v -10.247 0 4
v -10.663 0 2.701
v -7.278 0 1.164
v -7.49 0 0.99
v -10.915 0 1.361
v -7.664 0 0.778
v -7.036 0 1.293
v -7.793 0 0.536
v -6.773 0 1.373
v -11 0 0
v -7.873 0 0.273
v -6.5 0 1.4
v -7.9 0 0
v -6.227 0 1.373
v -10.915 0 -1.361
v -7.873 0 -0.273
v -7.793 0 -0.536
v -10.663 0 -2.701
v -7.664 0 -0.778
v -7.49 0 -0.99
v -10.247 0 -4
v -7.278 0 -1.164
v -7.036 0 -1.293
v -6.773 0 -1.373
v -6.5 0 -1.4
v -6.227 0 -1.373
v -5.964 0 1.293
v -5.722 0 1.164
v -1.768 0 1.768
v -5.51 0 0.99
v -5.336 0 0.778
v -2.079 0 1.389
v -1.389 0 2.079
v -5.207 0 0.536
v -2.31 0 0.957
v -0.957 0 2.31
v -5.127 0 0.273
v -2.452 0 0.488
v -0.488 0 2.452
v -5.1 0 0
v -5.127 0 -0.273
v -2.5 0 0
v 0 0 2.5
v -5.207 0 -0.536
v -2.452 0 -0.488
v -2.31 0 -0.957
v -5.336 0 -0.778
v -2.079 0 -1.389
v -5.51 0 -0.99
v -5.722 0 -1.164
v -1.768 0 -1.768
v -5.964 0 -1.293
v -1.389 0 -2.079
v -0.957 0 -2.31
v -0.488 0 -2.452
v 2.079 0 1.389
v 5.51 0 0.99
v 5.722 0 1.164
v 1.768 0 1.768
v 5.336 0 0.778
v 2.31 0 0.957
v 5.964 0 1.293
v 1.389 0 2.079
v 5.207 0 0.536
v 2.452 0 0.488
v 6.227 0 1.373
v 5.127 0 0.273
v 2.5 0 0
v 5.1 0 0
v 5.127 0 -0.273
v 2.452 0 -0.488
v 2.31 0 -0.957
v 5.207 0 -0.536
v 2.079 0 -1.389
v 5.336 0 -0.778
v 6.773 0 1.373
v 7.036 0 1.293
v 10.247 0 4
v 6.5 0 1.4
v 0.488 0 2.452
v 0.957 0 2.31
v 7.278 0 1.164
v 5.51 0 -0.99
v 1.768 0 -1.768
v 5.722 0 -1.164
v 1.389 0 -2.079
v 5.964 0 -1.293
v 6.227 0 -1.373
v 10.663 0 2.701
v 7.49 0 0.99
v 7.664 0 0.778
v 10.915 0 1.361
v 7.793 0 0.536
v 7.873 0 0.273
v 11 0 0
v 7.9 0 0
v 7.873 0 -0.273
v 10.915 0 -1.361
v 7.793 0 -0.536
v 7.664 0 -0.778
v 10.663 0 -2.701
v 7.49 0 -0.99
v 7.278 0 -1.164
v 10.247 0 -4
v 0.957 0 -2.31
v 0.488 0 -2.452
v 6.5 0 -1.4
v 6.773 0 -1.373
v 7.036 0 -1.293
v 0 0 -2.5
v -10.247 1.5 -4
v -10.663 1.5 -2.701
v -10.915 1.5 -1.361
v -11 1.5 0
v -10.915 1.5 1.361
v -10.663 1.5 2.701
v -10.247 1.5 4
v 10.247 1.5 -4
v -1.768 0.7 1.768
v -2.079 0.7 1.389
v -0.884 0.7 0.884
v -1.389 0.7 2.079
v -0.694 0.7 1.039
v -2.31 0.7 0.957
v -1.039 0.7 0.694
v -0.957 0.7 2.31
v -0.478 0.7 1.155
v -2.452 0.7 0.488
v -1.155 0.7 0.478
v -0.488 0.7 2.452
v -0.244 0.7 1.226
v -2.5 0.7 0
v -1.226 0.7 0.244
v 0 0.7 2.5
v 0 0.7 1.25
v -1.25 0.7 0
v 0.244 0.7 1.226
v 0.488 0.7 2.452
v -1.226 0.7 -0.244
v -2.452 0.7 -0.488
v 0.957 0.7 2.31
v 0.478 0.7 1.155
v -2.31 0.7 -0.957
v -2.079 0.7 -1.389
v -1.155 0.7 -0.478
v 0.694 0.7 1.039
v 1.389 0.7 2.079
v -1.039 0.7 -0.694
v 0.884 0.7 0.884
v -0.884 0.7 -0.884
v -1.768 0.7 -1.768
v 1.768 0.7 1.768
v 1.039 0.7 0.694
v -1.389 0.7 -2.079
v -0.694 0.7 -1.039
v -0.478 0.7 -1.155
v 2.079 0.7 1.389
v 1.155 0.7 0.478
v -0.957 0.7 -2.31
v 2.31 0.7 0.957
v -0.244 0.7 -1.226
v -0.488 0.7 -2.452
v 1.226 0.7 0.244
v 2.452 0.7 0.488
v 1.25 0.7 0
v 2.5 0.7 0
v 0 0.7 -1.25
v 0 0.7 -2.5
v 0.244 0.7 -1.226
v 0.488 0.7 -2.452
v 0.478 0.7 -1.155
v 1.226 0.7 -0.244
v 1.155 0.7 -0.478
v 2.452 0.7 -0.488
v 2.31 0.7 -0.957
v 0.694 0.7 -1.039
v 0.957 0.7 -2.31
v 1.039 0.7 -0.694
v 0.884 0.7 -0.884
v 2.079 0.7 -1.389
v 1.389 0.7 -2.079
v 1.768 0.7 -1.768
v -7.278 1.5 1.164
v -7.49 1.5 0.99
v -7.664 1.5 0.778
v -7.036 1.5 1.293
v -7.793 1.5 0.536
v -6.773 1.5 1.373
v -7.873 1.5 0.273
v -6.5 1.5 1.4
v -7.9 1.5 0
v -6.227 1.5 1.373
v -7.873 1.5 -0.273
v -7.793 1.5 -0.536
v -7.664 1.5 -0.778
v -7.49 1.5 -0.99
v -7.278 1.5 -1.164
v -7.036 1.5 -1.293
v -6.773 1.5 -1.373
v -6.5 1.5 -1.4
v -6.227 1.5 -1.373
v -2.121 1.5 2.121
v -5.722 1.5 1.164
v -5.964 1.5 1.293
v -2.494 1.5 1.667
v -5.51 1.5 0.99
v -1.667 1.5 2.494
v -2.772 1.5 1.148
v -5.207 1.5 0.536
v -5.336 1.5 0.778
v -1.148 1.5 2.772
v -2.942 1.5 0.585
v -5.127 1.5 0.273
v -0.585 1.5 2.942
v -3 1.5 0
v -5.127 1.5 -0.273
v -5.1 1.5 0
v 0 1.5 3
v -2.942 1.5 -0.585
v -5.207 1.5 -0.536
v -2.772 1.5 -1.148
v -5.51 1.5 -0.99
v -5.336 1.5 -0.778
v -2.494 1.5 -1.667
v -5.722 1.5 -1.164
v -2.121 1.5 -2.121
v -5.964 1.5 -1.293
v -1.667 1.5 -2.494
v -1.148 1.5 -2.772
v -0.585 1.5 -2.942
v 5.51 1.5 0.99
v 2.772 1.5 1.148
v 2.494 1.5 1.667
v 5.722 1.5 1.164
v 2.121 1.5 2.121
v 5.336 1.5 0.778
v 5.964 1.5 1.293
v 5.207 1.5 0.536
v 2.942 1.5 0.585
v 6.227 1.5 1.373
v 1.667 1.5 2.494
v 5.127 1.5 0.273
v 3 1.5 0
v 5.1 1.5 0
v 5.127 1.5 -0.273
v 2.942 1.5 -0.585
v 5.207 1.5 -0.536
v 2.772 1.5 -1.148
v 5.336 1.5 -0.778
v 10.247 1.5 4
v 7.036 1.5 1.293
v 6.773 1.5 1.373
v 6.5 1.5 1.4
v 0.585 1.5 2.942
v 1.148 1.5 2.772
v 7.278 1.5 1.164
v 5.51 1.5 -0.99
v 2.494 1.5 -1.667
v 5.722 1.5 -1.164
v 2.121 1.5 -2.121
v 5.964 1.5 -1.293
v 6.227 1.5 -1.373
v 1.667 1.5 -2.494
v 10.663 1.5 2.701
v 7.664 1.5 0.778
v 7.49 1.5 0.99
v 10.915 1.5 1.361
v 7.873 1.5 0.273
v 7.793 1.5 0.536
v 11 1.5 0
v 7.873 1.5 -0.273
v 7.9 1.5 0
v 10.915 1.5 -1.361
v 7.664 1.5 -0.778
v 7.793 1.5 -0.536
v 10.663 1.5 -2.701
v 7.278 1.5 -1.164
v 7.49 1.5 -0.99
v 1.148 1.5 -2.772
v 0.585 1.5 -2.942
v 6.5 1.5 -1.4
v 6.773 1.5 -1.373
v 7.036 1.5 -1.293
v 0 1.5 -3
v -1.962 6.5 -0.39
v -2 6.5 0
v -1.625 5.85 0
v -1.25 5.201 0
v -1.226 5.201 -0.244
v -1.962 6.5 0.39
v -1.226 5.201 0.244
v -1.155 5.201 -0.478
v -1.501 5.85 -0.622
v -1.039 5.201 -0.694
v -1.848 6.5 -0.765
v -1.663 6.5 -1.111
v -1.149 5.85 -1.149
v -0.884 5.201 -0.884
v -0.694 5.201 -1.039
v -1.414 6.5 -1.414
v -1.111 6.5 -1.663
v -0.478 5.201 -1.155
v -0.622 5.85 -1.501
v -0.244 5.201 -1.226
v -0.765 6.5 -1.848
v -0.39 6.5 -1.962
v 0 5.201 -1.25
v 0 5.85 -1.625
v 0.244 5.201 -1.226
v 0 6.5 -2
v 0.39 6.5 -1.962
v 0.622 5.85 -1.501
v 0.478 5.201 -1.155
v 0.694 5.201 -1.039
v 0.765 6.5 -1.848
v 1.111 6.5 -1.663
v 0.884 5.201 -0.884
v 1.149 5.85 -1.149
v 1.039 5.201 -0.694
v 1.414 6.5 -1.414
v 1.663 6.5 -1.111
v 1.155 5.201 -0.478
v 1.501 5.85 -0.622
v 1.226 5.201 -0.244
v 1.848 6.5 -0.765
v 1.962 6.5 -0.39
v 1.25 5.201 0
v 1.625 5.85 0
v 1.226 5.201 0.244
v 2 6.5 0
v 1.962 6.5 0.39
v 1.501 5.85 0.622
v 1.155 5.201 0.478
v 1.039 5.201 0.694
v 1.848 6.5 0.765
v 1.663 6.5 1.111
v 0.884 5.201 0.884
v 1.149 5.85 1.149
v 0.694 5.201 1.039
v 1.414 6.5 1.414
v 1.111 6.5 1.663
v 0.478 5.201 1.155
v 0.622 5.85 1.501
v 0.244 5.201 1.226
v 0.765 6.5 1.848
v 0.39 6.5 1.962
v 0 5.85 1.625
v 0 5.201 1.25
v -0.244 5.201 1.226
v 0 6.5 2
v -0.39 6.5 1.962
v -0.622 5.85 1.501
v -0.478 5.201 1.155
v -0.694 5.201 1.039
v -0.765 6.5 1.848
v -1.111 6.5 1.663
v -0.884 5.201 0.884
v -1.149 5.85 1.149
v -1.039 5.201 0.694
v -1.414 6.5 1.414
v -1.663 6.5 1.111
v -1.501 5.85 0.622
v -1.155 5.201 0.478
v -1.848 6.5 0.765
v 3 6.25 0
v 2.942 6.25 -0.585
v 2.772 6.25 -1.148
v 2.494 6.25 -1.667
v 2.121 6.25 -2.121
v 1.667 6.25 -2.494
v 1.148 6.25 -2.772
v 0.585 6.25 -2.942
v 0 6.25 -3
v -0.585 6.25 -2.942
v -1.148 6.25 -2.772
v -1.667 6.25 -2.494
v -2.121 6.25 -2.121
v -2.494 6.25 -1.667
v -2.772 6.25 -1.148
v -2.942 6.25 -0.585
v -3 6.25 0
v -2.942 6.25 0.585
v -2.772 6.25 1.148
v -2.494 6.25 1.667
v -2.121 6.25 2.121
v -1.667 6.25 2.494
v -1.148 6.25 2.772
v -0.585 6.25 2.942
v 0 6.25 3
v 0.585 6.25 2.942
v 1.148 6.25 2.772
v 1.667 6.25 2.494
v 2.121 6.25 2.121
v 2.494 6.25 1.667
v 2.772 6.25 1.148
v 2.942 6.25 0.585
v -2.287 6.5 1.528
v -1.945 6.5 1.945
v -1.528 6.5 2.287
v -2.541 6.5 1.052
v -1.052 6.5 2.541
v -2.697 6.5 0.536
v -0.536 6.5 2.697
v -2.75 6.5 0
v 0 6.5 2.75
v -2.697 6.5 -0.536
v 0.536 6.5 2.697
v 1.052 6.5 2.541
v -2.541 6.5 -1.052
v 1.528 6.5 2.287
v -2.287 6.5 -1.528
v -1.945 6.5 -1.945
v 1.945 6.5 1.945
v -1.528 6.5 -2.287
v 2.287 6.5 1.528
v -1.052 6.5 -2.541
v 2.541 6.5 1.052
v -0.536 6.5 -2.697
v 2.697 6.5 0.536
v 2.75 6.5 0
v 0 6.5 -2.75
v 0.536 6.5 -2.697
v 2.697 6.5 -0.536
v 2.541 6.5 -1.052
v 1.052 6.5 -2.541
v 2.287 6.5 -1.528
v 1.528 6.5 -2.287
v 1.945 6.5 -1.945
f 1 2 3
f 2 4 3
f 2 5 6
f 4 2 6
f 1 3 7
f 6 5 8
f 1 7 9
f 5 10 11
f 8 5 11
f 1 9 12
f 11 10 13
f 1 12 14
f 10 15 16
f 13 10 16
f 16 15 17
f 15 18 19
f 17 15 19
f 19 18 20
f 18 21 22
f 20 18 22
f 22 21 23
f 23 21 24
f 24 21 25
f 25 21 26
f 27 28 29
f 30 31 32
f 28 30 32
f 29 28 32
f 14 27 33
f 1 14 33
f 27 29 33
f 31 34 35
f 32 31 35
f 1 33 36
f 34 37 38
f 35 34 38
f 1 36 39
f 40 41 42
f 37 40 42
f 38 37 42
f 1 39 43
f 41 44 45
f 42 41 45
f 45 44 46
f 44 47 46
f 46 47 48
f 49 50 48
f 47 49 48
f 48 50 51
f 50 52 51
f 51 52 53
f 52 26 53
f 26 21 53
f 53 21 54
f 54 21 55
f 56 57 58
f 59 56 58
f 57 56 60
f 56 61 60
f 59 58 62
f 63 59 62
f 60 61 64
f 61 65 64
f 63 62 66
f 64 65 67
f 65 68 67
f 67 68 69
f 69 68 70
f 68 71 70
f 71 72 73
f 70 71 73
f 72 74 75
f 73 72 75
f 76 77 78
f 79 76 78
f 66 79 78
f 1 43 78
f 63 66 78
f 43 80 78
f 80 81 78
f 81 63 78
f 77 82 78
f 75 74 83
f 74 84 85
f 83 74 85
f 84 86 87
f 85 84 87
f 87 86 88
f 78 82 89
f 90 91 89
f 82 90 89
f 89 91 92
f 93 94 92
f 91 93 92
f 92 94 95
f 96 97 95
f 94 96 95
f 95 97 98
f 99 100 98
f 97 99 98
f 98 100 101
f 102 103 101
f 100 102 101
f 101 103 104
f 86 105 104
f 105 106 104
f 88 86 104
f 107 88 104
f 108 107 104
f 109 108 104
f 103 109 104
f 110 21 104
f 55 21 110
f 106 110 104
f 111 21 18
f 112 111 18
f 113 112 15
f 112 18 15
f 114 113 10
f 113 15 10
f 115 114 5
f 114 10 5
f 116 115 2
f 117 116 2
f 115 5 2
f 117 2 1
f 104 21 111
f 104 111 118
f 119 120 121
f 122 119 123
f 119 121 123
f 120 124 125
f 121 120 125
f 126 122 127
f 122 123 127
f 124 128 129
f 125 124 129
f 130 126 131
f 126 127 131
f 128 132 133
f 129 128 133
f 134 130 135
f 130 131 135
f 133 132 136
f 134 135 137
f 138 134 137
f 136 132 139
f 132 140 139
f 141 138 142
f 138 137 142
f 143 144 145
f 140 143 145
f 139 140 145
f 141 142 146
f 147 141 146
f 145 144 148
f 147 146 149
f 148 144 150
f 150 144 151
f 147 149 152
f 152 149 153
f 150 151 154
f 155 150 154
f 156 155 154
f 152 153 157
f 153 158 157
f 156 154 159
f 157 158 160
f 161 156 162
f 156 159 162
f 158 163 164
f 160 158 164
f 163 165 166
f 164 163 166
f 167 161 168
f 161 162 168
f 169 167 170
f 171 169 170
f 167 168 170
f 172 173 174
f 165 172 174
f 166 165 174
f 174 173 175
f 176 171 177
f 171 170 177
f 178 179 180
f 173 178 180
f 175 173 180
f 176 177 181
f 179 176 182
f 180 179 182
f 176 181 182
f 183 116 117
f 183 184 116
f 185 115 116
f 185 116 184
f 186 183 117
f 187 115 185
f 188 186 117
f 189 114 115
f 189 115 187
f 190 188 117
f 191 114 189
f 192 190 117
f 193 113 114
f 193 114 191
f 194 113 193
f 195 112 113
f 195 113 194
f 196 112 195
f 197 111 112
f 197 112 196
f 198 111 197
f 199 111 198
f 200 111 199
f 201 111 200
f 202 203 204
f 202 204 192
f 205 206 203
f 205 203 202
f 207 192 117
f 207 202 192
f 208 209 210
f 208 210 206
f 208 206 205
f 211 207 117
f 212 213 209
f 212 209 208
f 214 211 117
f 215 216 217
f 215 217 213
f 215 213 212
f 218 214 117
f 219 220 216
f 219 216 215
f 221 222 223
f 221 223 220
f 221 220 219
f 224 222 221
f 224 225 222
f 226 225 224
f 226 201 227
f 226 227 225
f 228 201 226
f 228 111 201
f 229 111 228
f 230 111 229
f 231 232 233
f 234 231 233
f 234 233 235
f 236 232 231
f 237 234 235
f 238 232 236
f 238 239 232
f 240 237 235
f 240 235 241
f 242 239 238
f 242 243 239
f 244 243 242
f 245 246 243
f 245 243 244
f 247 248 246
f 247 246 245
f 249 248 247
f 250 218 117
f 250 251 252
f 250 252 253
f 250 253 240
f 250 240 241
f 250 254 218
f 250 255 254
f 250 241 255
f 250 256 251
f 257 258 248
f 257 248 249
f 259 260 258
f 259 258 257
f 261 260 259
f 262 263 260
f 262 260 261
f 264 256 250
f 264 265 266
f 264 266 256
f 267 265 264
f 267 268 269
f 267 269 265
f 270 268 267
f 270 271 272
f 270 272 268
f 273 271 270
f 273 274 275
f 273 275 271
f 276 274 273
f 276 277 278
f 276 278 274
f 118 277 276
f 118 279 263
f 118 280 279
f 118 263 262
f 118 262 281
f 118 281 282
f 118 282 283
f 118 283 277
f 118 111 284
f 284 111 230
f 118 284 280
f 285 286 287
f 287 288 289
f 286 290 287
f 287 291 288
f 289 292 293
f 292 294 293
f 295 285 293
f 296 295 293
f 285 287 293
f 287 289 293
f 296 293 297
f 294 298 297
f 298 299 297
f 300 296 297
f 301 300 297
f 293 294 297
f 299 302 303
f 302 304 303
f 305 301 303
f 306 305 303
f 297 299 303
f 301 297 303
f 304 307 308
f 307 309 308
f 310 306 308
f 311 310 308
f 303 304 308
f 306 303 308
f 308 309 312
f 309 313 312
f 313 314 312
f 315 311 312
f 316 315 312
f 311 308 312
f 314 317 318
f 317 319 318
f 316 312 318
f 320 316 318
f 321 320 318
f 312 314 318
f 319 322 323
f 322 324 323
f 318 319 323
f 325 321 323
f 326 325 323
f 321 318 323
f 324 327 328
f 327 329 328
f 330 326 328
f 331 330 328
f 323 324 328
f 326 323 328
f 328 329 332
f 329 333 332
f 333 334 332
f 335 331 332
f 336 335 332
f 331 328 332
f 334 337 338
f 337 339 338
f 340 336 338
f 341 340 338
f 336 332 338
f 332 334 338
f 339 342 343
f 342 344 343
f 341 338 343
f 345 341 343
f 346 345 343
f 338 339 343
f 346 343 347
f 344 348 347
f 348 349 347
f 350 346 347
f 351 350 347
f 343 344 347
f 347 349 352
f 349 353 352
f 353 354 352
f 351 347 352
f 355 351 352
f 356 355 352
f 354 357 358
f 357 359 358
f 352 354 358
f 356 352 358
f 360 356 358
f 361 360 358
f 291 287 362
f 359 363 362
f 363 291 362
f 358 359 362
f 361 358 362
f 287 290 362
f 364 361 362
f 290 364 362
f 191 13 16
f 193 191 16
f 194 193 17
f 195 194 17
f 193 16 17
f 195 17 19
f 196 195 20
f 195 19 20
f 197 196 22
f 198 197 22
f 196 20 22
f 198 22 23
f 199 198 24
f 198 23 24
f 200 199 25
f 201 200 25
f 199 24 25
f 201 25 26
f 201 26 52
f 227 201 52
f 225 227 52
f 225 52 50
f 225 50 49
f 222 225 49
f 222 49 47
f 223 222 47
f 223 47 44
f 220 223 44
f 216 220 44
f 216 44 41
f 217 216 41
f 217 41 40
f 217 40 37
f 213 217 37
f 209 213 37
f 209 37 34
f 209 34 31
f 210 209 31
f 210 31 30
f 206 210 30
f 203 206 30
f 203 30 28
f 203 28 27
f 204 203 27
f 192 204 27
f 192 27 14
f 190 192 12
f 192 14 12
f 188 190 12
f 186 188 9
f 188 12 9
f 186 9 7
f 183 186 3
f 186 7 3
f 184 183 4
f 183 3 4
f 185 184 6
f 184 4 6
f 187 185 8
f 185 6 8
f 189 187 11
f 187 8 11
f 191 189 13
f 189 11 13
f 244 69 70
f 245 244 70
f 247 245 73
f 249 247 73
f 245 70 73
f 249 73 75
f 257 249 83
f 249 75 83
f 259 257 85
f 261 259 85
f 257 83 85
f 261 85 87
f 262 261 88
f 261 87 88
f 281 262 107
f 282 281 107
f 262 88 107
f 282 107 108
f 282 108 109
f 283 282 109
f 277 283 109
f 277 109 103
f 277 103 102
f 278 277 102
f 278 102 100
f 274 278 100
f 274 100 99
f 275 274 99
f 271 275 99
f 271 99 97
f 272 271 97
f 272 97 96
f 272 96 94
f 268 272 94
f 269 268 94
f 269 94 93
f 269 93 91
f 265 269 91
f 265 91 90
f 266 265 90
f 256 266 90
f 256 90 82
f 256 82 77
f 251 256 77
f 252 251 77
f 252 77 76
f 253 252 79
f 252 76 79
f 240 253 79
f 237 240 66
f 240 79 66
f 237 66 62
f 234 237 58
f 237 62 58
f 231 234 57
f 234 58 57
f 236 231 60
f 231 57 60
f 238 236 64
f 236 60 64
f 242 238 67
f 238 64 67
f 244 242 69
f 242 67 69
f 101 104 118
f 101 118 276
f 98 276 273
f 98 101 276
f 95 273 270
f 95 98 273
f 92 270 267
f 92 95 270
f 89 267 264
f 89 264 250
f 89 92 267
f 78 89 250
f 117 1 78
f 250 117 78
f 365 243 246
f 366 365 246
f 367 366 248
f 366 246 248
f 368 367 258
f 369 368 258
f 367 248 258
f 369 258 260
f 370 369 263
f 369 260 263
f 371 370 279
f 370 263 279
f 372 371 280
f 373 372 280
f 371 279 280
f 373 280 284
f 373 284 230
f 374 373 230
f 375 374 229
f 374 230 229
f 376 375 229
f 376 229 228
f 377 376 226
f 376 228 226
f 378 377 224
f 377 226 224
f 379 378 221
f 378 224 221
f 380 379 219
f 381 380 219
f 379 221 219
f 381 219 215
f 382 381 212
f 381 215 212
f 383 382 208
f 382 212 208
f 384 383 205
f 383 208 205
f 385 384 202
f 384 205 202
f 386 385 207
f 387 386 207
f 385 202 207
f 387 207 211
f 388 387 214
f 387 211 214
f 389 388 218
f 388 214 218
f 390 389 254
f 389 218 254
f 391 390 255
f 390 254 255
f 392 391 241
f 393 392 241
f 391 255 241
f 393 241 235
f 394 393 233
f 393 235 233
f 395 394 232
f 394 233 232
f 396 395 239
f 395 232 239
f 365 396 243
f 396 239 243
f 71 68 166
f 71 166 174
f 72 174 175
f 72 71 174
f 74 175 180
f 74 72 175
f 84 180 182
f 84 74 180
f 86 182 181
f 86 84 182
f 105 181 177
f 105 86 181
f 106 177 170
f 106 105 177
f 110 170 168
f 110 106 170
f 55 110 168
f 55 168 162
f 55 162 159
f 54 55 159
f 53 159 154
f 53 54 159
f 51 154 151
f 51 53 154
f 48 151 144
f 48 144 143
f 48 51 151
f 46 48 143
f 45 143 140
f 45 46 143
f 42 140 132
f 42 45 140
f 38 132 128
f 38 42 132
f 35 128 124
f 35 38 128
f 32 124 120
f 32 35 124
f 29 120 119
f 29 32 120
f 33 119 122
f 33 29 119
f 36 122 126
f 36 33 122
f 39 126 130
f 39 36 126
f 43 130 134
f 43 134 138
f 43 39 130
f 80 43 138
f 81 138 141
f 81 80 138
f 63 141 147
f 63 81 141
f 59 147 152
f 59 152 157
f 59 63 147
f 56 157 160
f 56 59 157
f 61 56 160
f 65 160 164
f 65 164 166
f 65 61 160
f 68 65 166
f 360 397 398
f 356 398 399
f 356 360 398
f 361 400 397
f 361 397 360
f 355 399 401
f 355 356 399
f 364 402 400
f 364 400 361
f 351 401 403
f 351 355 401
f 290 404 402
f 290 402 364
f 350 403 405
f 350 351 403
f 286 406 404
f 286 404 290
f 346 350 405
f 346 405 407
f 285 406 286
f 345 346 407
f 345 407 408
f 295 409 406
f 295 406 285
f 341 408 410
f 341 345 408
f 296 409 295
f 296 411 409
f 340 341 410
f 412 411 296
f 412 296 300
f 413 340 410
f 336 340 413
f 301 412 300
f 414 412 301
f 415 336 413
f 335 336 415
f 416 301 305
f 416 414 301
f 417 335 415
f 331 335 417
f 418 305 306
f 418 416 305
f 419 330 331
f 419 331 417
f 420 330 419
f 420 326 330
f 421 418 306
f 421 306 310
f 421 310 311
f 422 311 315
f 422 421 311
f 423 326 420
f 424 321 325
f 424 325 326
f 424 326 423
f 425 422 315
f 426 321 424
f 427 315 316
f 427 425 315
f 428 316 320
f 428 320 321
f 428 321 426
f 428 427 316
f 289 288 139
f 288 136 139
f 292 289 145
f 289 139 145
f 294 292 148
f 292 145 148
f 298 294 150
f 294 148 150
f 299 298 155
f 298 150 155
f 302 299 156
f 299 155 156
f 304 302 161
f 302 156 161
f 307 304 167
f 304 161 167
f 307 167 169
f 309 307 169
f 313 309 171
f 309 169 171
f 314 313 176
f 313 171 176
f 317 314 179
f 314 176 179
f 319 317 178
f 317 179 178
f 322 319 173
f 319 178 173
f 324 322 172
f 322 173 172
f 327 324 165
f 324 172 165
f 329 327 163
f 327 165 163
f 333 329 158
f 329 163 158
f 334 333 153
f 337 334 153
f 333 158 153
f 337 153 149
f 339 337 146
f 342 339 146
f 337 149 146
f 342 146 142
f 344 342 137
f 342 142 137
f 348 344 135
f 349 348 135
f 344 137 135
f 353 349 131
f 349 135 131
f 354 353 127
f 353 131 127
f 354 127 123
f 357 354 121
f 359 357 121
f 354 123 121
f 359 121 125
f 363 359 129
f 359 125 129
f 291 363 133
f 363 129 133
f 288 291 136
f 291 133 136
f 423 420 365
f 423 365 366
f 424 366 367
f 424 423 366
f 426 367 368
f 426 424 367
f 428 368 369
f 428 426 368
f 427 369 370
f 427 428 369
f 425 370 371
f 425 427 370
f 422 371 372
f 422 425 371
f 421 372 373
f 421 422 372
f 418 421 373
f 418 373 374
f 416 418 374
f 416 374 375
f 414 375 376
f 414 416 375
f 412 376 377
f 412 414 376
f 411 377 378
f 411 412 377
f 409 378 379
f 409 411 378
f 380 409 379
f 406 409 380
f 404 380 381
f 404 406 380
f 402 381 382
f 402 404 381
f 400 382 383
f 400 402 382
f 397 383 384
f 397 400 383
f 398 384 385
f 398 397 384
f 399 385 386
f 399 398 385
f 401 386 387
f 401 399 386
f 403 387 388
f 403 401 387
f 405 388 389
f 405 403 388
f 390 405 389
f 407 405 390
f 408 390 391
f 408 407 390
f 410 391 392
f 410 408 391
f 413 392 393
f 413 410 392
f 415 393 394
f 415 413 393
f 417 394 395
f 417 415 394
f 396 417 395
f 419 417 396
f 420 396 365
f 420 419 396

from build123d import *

# Parameters (mm, degrees)
BASE_SKETCH_W                   = 20.493901532
BASE_SKETCH_H                   = 8
BASE_EXTRUDE_DEPTH              = 1.5
PROTRUSION_START                = 1.5
PROTRUSION_SKETCH_R             = 3
PROTRUSION_EXTRUDE_DEPTH        = 5
F_2_8_2_8_DIAMETER_HOLE1_D      = 2.8
PROTRUSION_CHAMFER_SIZE         = 0.25
F_2_5MM_DOWEL_HOLE3_D           = 2.5
F_2_5MM_DOWEL_HOLE3_DEPTH       = 6.5
F_2_5MM_DOWEL_HOLE3_CSINK_D     = 4
F_2_5MM_DOWEL_HOLE3_CSINK_ANGLE = 60
F_5MM_CIRCLE_SKETCH_R           = 2.5
F_5MM_DIAMETER_CUT_DEPTH        = 0.7


with BuildPart() as part:
    # Base Sketch → Base Extrude (new body)
    with BuildSketch(Plane(origin=(0, 0, 0), x_dir=(1, 0, 0), z_dir=(0, 1, 0))):
        with BuildLine():
            Line((-10.246950766, -4), (-10.246950766, 4))
            ThreePointArc((-10.246950766, 4), (-11, 0), (-10.246950766, -4))
        make_face()
        Rectangle(BASE_SKETCH_W, BASE_SKETCH_H)
        with BuildLine():
            Line((10.246950766, -4), (10.246950766, 4))
            ThreePointArc((10.246950766, 4), (11, 0), (10.246950766, -4))
        make_face()
    extrude(amount=BASE_EXTRUDE_DEPTH)

    # Protrusion Sketch → Protrusion Extrude (add)
    with BuildSketch(Plane(origin=(0, 0, 0), x_dir=(1, 0, 0), z_dir=(0, 1, 0)).offset(PROTRUSION_START)):
        Circle(PROTRUSION_SKETCH_R)
    extrude(amount=PROTRUSION_EXTRUDE_DEPTH)

    # Ø2.8 (2.8) Diameter Hole1 (through all)
    with Locations(Plane(origin=(0, 1.5, 0), x_dir=(1, 0, 0), z_dir=(0, 1, 0))):
        with Locations((-6.5, 0), (6.5, 0)):
            Hole(F_2_8_2_8_DIAMETER_HOLE1_D / 2)

    # Protrusion Chamfer
    protrusion_chamfer_edges = [part.edges().sort_by_distance(p)[0] for p in [
        (-3, 6.5, 0),
    ]]
    chamfer(protrusion_chamfer_edges, length=PROTRUSION_CHAMFER_SIZE)

    # Ø2.5mm Dowel Hole3
    with Locations(Plane(origin=(0, 6.5, 0), x_dir=(1, 0, 0), z_dir=(0, 1, 0))):
        with Locations((0, 0)):
            CounterSinkHole(F_2_5MM_DOWEL_HOLE3_D / 2, F_2_5MM_DOWEL_HOLE3_CSINK_D / 2, depth=F_2_5MM_DOWEL_HOLE3_DEPTH, counter_sink_angle=F_2_5MM_DOWEL_HOLE3_CSINK_ANGLE)

    # 5mm Circle Sketch → 5mm Diameter Cut (cut)
    with BuildSketch(Plane(origin=(0, 0, 0), x_dir=(1, 0, 0), z_dir=(0, 1, 0))):
        Circle(F_5MM_CIRCLE_SKETCH_R)
    extrude(amount=F_5MM_DIAMETER_CUT_DEPTH, mode=Mode.SUBTRACT)


solid = part.part
